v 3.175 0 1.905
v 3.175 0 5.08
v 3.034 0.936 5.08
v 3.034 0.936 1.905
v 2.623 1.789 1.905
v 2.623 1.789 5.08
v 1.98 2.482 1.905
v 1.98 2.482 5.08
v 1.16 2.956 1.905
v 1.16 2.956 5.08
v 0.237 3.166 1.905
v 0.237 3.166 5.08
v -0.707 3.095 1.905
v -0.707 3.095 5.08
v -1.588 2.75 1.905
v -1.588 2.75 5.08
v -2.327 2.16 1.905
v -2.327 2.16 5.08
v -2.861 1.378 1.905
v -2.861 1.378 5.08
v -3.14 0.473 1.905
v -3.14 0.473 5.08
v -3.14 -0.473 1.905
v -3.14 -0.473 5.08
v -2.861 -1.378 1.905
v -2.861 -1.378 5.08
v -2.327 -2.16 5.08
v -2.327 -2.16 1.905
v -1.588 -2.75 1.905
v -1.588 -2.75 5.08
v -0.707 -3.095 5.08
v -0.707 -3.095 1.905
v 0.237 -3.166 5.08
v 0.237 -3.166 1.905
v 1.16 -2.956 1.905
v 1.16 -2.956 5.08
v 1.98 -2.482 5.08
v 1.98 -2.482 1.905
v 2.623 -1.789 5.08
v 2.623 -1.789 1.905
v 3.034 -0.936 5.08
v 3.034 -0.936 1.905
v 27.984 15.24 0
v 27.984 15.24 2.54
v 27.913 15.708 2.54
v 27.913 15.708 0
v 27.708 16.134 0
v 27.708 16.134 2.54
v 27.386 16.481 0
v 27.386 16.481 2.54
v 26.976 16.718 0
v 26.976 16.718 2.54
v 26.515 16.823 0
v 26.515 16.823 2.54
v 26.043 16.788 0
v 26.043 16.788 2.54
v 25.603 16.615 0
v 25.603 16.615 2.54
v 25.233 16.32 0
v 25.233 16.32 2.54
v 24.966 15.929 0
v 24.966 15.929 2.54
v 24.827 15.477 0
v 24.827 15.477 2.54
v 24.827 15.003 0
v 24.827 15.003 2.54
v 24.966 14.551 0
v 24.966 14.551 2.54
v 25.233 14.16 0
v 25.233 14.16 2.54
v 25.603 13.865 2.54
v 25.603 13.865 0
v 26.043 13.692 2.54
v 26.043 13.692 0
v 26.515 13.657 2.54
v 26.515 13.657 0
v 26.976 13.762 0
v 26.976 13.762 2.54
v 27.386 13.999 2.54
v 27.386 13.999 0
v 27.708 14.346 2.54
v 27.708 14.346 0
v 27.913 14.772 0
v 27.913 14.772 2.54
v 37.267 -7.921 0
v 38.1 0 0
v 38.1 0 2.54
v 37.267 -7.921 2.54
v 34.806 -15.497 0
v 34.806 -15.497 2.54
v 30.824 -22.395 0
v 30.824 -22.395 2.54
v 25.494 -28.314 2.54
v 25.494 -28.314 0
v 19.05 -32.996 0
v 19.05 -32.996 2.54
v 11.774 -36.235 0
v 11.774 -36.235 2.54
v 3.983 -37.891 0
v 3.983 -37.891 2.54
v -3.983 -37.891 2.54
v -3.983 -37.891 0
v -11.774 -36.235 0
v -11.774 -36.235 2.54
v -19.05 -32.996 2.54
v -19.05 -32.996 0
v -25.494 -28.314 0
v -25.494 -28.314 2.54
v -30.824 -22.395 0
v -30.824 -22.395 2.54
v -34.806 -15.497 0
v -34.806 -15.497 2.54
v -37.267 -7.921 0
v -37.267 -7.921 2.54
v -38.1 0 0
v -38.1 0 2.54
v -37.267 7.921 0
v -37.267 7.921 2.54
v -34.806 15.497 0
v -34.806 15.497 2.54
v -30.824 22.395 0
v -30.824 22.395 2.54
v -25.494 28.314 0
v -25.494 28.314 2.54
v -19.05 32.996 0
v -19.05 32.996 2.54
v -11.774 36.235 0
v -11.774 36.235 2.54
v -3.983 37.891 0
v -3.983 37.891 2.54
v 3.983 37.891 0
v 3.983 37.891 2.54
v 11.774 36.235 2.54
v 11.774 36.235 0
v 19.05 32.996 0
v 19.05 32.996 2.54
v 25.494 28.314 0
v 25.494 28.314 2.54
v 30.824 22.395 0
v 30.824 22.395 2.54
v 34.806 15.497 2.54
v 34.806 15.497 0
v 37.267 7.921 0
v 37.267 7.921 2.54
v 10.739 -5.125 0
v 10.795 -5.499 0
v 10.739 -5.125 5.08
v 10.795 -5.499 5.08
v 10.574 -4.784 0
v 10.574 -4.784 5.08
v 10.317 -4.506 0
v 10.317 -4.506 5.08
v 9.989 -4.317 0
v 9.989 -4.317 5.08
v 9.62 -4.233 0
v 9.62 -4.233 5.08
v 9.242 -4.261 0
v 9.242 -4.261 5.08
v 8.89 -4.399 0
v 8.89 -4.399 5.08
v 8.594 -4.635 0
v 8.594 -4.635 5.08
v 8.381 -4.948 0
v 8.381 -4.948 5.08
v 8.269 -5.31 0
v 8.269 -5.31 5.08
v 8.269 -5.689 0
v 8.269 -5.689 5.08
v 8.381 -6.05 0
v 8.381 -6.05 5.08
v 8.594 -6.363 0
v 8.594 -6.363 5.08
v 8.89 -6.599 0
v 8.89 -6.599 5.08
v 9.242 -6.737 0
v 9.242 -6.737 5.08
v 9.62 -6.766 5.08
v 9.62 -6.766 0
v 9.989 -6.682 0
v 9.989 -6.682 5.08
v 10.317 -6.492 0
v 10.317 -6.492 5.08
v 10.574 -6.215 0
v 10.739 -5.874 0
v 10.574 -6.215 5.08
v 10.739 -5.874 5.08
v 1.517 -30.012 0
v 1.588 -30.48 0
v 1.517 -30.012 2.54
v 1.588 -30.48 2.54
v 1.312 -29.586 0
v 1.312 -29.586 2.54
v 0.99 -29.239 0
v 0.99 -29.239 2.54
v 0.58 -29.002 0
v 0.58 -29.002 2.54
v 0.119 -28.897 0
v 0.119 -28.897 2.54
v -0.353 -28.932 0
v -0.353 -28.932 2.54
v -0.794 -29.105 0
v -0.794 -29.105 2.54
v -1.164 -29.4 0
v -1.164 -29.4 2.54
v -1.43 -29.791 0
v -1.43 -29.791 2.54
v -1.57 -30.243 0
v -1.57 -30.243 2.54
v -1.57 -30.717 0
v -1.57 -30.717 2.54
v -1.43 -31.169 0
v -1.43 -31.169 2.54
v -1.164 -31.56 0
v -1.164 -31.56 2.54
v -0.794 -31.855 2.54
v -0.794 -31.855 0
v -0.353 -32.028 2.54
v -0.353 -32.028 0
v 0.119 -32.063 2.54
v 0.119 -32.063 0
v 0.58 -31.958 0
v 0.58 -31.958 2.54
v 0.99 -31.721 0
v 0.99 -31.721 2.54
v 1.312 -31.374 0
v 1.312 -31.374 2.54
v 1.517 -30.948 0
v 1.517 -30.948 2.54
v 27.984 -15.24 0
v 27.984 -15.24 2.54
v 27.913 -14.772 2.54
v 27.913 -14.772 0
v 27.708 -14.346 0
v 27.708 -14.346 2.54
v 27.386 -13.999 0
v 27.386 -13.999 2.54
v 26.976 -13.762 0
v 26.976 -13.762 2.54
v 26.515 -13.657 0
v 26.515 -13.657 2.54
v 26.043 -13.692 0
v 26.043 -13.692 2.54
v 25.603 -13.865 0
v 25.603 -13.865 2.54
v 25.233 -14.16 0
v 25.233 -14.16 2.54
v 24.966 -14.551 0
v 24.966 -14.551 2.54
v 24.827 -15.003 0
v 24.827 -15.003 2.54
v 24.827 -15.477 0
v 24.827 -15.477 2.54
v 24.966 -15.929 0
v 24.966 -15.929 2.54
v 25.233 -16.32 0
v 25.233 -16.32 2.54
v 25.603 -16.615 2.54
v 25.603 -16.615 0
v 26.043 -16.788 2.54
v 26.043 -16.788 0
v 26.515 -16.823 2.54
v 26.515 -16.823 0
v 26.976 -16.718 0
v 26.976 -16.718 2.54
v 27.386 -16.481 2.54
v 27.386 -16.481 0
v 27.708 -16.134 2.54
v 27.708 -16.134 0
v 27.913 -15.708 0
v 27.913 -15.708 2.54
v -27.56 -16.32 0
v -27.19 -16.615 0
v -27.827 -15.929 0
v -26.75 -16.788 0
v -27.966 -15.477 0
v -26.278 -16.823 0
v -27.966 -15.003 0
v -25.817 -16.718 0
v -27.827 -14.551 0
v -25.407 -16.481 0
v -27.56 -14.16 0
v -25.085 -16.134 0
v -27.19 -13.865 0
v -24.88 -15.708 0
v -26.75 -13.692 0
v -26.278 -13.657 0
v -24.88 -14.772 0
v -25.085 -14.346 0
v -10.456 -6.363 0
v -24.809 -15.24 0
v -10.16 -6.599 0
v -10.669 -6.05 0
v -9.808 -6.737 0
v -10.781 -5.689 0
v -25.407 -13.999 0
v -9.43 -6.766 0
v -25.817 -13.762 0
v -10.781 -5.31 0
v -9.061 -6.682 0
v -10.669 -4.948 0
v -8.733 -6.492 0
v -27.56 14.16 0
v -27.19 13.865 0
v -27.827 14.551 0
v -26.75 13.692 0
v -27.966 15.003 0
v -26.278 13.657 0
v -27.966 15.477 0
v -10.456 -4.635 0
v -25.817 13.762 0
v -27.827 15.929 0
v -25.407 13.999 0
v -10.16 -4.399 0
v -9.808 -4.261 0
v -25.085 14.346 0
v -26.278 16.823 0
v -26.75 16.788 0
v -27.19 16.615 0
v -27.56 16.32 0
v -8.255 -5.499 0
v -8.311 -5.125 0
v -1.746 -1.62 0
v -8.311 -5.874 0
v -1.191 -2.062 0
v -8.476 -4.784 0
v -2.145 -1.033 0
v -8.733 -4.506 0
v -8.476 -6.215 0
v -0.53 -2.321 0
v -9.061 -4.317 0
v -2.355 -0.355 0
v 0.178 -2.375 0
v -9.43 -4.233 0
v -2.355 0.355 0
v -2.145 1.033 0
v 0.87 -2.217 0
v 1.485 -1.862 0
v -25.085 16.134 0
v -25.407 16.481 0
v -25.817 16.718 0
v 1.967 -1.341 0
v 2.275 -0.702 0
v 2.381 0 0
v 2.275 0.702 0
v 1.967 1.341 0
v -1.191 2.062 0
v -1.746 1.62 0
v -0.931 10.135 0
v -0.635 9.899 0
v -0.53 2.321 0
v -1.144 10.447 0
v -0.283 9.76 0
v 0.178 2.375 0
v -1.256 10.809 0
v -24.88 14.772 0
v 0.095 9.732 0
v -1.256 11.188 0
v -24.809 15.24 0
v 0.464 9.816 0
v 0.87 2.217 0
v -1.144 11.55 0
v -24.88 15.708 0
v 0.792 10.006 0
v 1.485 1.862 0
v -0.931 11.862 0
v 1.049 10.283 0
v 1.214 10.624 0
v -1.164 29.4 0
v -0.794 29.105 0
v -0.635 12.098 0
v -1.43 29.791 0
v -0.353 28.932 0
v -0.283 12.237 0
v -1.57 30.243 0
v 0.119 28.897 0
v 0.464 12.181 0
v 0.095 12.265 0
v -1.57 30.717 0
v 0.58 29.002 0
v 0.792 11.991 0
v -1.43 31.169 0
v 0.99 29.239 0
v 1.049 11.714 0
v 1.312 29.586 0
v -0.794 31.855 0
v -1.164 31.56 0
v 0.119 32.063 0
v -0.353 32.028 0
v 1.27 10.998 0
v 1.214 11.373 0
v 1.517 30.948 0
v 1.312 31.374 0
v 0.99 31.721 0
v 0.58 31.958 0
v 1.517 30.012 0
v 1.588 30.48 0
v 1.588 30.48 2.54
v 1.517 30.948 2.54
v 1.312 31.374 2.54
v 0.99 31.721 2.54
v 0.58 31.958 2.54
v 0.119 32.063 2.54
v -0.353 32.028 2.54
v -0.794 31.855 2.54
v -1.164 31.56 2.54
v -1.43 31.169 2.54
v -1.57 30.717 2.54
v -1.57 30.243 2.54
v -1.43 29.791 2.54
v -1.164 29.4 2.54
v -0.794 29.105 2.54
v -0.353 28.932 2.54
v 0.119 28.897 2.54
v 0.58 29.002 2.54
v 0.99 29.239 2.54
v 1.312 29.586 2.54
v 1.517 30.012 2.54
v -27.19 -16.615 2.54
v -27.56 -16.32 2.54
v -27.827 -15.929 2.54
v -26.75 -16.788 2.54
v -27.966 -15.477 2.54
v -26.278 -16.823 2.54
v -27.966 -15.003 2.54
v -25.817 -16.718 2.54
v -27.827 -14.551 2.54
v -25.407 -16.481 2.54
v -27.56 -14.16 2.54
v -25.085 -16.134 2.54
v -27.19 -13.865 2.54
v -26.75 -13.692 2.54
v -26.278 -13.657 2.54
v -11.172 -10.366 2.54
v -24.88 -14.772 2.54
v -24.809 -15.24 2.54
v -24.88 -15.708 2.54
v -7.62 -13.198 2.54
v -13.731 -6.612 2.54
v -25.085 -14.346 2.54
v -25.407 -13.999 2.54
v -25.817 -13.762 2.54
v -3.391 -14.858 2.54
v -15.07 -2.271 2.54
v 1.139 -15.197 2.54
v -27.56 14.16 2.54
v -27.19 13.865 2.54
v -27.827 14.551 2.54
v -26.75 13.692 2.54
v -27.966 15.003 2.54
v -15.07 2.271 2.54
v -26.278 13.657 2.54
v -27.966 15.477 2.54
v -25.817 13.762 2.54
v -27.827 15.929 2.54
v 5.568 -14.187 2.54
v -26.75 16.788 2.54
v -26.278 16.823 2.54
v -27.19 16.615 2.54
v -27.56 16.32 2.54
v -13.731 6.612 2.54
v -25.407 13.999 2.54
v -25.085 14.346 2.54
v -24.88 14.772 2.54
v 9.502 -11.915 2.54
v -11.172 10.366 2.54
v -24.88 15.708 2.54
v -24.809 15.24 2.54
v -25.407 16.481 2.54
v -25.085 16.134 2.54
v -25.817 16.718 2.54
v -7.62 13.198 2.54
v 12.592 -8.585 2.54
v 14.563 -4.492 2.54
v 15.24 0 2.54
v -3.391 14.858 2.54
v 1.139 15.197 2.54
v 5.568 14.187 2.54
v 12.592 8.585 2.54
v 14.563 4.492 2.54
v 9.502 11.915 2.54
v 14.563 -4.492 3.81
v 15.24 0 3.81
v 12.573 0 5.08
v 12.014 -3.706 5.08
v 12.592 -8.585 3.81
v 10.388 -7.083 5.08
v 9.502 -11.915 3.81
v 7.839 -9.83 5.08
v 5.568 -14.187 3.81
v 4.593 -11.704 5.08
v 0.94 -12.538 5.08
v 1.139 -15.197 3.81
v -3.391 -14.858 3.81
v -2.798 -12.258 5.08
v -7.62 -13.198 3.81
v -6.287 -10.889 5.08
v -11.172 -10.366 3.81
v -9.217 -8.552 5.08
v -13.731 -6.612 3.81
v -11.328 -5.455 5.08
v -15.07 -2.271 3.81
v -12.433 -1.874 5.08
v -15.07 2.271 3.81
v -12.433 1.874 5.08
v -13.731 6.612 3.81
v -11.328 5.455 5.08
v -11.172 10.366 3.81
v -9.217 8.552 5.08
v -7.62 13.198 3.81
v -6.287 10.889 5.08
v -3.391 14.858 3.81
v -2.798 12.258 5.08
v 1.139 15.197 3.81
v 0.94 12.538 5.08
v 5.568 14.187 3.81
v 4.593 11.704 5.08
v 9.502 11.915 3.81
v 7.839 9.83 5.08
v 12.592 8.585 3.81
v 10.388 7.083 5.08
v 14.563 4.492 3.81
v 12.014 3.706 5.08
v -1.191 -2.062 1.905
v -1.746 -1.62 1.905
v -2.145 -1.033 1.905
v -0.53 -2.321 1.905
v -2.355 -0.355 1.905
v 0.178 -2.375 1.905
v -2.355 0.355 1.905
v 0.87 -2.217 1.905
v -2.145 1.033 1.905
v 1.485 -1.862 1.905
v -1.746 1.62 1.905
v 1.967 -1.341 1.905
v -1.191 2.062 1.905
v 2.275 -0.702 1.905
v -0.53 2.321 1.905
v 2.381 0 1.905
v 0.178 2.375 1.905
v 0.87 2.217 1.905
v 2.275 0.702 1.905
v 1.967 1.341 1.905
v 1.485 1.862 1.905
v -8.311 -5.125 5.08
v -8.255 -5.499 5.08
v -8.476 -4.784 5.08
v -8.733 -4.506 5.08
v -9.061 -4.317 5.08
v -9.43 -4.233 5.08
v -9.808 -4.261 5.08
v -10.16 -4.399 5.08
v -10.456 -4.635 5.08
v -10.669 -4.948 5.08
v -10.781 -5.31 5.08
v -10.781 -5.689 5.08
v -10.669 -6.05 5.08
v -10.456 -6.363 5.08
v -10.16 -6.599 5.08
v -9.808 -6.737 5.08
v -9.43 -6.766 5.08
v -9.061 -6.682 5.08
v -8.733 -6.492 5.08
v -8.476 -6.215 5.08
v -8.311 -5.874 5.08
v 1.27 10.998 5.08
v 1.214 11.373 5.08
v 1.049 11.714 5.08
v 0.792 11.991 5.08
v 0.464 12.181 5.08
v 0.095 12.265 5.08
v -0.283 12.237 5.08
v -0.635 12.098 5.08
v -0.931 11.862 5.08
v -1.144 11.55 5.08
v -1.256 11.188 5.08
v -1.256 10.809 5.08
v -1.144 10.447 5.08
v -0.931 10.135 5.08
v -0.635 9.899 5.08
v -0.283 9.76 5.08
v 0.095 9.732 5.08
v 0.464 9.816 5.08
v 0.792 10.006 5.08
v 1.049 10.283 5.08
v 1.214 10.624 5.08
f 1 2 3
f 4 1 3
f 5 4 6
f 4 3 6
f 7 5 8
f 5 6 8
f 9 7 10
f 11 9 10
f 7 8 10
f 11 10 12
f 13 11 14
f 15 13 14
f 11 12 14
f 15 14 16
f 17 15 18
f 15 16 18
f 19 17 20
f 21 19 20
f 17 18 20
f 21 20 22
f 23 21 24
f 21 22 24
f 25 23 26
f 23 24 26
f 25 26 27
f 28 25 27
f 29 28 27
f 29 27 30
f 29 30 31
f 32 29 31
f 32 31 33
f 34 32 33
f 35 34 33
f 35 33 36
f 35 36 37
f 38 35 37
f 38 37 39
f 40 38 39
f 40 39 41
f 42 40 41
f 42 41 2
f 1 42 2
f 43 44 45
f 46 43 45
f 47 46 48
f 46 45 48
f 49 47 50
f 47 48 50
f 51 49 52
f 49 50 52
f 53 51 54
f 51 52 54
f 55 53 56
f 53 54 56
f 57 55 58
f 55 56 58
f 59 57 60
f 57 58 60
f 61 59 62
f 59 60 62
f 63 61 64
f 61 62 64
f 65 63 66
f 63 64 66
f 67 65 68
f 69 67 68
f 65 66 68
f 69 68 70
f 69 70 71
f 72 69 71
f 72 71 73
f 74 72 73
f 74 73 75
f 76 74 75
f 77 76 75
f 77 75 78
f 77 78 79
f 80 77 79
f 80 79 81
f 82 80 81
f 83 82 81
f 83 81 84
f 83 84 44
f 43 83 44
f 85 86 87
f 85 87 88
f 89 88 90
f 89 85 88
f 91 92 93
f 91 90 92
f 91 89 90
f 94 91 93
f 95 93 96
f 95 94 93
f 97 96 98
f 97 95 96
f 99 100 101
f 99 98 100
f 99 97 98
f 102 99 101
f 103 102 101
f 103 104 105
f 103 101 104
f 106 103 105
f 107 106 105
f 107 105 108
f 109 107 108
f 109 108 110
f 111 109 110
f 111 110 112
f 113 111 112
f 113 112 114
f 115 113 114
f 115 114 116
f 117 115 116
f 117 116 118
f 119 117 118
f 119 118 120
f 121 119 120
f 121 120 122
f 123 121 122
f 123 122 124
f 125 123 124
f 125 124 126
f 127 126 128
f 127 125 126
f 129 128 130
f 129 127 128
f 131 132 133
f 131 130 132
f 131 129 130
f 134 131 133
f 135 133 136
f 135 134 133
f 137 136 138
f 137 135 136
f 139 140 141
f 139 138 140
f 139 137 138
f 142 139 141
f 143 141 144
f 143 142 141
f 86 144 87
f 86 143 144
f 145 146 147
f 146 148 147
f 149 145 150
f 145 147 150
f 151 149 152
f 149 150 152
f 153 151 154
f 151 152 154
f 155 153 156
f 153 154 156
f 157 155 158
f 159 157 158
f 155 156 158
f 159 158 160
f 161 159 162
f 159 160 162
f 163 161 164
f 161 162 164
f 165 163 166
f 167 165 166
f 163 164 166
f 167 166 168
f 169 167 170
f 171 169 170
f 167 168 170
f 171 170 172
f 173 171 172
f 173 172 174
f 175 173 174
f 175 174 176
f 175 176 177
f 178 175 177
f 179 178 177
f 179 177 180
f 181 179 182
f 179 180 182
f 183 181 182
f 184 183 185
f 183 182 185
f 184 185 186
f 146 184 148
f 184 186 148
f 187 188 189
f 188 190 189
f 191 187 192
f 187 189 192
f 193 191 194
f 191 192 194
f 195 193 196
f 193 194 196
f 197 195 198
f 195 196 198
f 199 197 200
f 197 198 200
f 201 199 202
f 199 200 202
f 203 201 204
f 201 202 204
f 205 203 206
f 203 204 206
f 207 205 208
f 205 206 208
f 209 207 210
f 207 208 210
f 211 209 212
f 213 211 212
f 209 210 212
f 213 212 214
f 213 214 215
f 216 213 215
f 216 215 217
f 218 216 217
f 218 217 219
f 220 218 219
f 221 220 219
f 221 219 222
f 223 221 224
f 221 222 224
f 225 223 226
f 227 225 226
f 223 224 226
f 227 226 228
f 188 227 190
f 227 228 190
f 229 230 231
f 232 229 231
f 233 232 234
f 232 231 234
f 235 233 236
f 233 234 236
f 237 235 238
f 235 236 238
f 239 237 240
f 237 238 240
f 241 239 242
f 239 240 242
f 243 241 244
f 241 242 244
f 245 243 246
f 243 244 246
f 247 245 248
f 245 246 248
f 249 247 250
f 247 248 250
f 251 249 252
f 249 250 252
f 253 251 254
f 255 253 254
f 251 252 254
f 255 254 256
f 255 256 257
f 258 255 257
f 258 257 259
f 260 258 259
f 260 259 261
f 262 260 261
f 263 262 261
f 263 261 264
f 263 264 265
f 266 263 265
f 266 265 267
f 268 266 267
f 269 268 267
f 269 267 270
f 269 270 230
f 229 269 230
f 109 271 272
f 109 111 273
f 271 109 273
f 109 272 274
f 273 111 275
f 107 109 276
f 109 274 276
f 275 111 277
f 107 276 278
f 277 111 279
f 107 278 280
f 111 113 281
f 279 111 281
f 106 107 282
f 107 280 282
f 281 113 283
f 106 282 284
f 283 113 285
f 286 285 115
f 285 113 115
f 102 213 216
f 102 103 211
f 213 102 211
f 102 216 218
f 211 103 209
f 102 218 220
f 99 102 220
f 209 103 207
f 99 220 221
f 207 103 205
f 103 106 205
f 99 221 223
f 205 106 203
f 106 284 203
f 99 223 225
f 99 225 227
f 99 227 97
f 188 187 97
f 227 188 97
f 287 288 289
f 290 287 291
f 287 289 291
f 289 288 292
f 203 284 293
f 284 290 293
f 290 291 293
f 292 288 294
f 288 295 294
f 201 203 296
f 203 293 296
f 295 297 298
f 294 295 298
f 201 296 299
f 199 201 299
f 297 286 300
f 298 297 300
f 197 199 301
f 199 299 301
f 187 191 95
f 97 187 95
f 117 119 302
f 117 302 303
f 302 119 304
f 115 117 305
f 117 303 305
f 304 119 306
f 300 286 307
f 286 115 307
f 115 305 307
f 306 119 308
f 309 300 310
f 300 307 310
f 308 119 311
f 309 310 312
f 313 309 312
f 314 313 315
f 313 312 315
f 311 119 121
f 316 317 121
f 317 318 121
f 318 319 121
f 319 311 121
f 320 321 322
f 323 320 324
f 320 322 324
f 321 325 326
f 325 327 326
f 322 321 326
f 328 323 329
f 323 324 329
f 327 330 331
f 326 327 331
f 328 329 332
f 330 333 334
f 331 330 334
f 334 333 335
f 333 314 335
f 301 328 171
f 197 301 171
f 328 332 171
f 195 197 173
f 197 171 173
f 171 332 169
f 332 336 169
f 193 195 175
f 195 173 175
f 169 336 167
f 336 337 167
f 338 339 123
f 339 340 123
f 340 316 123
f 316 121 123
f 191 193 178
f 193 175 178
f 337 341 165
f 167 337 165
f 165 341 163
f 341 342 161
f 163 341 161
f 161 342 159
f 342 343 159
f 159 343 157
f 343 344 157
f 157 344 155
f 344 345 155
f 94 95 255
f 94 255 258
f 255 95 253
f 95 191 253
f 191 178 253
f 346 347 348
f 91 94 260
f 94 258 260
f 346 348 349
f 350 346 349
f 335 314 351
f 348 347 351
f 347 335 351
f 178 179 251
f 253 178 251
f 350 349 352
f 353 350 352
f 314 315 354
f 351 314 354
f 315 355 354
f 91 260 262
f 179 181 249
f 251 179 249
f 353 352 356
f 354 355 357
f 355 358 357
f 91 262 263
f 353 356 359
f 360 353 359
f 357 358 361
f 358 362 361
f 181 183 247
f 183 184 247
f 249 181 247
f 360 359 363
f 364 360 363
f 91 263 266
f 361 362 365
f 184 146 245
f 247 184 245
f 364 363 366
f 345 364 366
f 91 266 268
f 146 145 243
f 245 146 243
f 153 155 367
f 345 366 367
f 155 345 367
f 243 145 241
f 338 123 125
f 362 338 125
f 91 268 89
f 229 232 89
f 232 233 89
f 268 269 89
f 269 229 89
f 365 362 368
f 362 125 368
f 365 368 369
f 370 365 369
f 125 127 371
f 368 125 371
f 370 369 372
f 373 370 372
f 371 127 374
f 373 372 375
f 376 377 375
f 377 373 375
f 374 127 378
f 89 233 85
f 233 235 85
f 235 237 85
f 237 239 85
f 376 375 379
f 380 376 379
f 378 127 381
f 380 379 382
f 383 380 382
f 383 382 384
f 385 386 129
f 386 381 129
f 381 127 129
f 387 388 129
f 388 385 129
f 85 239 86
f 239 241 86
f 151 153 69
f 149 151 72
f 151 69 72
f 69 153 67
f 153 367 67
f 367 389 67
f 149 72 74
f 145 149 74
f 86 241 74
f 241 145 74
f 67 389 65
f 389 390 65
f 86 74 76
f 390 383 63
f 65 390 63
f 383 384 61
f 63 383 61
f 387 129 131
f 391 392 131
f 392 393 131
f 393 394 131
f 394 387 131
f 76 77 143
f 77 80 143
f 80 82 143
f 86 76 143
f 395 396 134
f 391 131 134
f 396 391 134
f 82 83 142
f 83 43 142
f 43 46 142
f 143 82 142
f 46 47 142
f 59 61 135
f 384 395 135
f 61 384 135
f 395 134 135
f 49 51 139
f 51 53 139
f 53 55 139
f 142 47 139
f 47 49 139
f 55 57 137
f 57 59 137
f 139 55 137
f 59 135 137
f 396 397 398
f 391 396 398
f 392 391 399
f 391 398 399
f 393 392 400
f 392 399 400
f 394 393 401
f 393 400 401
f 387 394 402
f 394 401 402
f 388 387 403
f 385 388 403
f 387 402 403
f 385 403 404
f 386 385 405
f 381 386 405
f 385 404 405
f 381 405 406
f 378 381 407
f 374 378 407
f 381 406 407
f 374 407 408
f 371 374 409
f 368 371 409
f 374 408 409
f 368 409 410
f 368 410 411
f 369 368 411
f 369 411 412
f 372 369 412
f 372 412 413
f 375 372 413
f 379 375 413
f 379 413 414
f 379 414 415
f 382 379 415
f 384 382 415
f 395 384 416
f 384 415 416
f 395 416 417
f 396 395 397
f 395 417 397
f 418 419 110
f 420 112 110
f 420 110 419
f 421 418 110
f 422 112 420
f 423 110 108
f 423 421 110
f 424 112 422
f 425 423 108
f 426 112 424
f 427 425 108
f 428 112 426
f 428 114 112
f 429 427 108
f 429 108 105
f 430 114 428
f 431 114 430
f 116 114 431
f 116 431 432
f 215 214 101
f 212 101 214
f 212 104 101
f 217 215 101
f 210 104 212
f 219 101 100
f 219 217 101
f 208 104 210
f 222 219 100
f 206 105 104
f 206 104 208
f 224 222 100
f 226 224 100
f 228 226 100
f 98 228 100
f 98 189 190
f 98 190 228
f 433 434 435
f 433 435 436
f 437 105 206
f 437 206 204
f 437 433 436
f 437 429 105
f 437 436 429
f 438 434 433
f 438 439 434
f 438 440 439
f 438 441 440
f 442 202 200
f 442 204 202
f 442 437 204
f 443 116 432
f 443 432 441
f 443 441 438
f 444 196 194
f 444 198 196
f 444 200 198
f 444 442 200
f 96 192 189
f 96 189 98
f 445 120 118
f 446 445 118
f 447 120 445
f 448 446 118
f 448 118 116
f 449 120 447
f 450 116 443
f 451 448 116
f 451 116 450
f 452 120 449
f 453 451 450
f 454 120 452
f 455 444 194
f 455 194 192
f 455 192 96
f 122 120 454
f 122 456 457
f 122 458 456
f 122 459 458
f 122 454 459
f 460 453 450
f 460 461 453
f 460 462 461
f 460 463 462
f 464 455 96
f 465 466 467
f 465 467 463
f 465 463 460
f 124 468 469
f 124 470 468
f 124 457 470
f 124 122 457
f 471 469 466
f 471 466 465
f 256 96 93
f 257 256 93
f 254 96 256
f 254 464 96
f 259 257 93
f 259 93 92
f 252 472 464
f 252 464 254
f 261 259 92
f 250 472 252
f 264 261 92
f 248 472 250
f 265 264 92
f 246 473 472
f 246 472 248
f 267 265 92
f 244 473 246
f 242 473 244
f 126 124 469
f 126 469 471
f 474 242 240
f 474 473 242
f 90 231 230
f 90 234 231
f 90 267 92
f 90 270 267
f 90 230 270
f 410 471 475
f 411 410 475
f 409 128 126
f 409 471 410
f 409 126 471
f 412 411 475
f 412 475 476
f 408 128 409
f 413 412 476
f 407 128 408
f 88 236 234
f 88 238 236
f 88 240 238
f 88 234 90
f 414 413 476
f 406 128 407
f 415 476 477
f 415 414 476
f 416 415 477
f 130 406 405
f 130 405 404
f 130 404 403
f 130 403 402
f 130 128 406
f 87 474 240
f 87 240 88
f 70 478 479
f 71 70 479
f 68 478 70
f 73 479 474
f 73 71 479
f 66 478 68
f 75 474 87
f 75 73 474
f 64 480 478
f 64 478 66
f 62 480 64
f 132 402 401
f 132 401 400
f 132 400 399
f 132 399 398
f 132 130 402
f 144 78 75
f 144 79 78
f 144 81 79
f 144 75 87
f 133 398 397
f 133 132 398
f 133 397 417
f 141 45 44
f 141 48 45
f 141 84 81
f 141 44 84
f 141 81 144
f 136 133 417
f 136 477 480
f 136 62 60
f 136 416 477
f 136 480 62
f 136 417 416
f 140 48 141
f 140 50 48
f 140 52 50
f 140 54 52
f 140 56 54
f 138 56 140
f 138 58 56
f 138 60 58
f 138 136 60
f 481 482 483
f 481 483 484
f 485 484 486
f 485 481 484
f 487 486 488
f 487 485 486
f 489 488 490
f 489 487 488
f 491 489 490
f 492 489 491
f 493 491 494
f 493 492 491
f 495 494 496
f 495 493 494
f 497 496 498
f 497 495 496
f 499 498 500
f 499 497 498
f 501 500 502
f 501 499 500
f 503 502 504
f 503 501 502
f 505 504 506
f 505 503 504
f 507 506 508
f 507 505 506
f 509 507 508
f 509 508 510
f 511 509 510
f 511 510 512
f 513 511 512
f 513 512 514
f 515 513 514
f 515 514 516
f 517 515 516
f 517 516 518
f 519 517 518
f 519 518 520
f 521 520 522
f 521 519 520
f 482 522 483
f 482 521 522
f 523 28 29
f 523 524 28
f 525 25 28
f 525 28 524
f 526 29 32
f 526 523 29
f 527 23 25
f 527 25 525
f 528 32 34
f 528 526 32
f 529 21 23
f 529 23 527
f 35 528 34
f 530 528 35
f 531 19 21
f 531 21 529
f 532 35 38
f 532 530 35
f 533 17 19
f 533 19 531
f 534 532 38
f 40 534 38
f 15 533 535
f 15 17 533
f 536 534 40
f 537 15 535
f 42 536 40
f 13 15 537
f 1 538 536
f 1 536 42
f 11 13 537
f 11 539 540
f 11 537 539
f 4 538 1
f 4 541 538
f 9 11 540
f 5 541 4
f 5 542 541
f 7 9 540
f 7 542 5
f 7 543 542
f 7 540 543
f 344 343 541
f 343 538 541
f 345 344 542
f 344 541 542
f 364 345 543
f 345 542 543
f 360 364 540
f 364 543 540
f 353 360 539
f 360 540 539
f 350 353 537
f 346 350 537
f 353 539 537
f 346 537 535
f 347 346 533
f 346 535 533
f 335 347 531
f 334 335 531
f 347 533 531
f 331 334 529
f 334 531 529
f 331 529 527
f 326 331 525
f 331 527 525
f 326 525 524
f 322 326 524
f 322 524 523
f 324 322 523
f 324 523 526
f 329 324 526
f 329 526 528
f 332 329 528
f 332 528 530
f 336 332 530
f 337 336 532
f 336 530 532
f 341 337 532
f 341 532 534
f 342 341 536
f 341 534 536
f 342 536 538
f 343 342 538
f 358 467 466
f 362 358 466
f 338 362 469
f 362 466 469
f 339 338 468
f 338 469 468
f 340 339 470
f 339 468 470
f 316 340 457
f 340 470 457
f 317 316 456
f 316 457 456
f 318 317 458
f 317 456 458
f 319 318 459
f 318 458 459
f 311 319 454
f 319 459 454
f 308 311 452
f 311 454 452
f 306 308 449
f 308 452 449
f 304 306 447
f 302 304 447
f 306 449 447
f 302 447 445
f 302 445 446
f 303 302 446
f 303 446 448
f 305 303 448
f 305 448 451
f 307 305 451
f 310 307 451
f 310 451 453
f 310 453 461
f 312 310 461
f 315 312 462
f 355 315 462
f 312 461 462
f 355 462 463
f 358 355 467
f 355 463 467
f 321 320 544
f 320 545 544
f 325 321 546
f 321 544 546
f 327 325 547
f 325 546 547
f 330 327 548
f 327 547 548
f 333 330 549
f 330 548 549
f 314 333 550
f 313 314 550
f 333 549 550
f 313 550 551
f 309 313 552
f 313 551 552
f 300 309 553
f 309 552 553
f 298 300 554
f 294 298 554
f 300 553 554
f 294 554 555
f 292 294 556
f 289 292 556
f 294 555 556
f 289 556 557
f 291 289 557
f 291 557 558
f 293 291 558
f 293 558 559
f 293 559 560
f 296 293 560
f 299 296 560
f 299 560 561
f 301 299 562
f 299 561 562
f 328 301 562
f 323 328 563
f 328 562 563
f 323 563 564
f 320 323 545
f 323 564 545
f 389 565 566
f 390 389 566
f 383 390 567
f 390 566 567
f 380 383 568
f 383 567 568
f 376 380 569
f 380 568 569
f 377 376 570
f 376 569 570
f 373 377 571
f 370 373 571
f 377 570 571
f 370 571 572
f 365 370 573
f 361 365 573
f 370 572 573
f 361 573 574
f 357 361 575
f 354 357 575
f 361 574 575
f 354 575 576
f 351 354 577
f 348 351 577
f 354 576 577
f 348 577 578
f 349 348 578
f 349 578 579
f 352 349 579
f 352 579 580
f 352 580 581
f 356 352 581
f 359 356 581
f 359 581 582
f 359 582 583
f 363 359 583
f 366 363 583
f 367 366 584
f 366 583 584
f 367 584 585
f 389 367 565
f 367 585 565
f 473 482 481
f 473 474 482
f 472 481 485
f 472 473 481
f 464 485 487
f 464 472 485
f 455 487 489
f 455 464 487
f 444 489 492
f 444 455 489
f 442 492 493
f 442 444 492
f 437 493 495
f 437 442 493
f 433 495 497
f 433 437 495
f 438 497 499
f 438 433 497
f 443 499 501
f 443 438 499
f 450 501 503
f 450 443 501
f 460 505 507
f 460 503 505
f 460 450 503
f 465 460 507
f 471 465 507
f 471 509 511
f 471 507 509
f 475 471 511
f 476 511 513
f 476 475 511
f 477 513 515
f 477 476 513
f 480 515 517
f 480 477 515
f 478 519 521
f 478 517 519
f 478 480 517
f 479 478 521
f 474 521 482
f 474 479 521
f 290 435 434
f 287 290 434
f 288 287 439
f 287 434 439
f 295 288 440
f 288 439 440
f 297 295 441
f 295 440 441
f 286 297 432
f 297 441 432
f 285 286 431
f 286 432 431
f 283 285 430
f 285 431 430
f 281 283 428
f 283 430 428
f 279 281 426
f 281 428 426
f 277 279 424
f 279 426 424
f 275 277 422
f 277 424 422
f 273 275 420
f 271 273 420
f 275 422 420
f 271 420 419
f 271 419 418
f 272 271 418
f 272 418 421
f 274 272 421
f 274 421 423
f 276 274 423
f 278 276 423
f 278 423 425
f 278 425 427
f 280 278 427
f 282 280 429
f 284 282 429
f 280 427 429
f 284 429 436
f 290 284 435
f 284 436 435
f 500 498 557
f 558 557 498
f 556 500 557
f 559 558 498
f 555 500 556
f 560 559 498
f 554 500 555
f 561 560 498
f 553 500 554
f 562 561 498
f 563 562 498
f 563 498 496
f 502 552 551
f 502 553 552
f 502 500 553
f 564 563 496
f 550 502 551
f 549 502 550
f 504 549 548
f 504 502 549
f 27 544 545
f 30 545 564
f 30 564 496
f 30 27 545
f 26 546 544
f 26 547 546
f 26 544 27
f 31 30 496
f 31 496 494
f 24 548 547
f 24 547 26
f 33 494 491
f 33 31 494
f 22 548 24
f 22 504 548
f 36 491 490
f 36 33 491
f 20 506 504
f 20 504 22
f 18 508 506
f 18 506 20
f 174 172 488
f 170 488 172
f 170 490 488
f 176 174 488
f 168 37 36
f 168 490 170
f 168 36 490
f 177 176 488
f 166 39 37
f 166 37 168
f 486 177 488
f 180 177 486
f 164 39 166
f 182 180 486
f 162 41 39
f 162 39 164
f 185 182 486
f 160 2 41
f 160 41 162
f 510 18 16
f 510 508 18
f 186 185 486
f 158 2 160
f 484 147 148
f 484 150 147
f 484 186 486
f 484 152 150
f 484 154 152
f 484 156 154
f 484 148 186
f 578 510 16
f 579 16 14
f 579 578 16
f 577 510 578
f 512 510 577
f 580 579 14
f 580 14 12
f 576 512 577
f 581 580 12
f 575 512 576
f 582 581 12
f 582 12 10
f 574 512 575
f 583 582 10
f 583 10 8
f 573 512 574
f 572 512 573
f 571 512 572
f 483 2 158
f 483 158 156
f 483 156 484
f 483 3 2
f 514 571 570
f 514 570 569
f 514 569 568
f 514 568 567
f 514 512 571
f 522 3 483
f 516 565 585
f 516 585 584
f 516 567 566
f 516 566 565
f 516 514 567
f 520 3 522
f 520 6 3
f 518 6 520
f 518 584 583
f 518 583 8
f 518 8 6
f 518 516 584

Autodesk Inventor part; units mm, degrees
ref_plane "YZ Plane" through (0, 0, 0) normal (1, 0, 0) x (0, 1, 0)
ref_plane "XZ Plane" through (0, 0, 0) normal (0, 1, 0) x (-1, 0, 0)
ref_plane "XY Plane" through (0, 0, 0) normal (0, 0, 1) x (1, 0, 0)
sketch "Sketch1" plane through (0, 0, 0) normal (0, 0, 1) x (1, 0, 0)
  circle A0 centre (0, 0) radius 38.1
  dimension "d0" = 76.2
extrude "Extrusion1" add sketch "Sketch1" along normal blind 2.54
sketch "Sketch5" plane through (0, 0, 2.54) normal (0, 0, 1) x (1, 0, 0)
  circle A0 centre (0, 0) radius 15.24
  dimension "d24" = 30.48
extrude "Extrusion7" add sketch "Sketch5" along normal blind 2.54
sketch "Sketch6" plane through (0, 0, 5.08) normal (0, 0, 1) x (1, 0, 0)
  line L0 (0, 0) -> (0, 10.9985)
  circle A0 centre (0, 10.9985) radius 1.27
  circle A1 centre (-9.525, -5.4993) radius 1.27
  circle A2 centre (9.525, -5.4993) radius 1.27
  dimension "d28" = 2.54
  dimension "d31" = 360
  dimension "d49" = 19.05
extrude "Extrusion8" cut sketch "Sketch6" against normal through all
sketch "Sketch7" plane through (0, 0, 5.08) normal (0, 0, 1) x (1, 0, 0)
  circle A0 centre (0, 0) radius 3.175
  dimension "d35" = 6.35
extrude "Extrusion9" cut sketch "Sketch7" against normal blind 3.175
sketch "Sketch8" plane through (0, 0, 1.905) normal (0, 0, 1) x (1, 0, 0)
  circle A0 centre (0, 0) radius 2.3812
  dimension "d38" = 4.7625
extrude "Extrusion10" cut sketch "Sketch8" against normal through all
sketch "Sketch9" plane through (0, 0, 2.54) normal (0, 0, 1) x (1, 0, 0)
  line L0 (0, 0) -> (0, 30.48)
  circle A0 centre (0, 30.48) radius 1.5875
  circle A1 centre (-26.3965, 15.24) radius 1.5875
  circle A2 centre (-26.3965, -15.24) radius 1.5875
  circle A3 centre (0, -30.48) radius 1.5875
  circle A4 centre (26.3965, -15.24) radius 1.5875
  circle A5 centre (26.3965, 15.24) radius 1.5875
  dimension "d41" = 30.48
  dimension "d42" = 3.175
  dimension "d45" = 360
extrude "Extrusion11" cut sketch "Sketch9" against normal blind 25.4
chamfer "Chamfer1" distance 2.667 distance2 1.27 1 edges at (-15.24, 0, 5.08) measured on face at (4.9695, 7.5399, 5.08)
properties part number "SpoolEndSpurSideLargeSpur" material "ABS Plastic"
